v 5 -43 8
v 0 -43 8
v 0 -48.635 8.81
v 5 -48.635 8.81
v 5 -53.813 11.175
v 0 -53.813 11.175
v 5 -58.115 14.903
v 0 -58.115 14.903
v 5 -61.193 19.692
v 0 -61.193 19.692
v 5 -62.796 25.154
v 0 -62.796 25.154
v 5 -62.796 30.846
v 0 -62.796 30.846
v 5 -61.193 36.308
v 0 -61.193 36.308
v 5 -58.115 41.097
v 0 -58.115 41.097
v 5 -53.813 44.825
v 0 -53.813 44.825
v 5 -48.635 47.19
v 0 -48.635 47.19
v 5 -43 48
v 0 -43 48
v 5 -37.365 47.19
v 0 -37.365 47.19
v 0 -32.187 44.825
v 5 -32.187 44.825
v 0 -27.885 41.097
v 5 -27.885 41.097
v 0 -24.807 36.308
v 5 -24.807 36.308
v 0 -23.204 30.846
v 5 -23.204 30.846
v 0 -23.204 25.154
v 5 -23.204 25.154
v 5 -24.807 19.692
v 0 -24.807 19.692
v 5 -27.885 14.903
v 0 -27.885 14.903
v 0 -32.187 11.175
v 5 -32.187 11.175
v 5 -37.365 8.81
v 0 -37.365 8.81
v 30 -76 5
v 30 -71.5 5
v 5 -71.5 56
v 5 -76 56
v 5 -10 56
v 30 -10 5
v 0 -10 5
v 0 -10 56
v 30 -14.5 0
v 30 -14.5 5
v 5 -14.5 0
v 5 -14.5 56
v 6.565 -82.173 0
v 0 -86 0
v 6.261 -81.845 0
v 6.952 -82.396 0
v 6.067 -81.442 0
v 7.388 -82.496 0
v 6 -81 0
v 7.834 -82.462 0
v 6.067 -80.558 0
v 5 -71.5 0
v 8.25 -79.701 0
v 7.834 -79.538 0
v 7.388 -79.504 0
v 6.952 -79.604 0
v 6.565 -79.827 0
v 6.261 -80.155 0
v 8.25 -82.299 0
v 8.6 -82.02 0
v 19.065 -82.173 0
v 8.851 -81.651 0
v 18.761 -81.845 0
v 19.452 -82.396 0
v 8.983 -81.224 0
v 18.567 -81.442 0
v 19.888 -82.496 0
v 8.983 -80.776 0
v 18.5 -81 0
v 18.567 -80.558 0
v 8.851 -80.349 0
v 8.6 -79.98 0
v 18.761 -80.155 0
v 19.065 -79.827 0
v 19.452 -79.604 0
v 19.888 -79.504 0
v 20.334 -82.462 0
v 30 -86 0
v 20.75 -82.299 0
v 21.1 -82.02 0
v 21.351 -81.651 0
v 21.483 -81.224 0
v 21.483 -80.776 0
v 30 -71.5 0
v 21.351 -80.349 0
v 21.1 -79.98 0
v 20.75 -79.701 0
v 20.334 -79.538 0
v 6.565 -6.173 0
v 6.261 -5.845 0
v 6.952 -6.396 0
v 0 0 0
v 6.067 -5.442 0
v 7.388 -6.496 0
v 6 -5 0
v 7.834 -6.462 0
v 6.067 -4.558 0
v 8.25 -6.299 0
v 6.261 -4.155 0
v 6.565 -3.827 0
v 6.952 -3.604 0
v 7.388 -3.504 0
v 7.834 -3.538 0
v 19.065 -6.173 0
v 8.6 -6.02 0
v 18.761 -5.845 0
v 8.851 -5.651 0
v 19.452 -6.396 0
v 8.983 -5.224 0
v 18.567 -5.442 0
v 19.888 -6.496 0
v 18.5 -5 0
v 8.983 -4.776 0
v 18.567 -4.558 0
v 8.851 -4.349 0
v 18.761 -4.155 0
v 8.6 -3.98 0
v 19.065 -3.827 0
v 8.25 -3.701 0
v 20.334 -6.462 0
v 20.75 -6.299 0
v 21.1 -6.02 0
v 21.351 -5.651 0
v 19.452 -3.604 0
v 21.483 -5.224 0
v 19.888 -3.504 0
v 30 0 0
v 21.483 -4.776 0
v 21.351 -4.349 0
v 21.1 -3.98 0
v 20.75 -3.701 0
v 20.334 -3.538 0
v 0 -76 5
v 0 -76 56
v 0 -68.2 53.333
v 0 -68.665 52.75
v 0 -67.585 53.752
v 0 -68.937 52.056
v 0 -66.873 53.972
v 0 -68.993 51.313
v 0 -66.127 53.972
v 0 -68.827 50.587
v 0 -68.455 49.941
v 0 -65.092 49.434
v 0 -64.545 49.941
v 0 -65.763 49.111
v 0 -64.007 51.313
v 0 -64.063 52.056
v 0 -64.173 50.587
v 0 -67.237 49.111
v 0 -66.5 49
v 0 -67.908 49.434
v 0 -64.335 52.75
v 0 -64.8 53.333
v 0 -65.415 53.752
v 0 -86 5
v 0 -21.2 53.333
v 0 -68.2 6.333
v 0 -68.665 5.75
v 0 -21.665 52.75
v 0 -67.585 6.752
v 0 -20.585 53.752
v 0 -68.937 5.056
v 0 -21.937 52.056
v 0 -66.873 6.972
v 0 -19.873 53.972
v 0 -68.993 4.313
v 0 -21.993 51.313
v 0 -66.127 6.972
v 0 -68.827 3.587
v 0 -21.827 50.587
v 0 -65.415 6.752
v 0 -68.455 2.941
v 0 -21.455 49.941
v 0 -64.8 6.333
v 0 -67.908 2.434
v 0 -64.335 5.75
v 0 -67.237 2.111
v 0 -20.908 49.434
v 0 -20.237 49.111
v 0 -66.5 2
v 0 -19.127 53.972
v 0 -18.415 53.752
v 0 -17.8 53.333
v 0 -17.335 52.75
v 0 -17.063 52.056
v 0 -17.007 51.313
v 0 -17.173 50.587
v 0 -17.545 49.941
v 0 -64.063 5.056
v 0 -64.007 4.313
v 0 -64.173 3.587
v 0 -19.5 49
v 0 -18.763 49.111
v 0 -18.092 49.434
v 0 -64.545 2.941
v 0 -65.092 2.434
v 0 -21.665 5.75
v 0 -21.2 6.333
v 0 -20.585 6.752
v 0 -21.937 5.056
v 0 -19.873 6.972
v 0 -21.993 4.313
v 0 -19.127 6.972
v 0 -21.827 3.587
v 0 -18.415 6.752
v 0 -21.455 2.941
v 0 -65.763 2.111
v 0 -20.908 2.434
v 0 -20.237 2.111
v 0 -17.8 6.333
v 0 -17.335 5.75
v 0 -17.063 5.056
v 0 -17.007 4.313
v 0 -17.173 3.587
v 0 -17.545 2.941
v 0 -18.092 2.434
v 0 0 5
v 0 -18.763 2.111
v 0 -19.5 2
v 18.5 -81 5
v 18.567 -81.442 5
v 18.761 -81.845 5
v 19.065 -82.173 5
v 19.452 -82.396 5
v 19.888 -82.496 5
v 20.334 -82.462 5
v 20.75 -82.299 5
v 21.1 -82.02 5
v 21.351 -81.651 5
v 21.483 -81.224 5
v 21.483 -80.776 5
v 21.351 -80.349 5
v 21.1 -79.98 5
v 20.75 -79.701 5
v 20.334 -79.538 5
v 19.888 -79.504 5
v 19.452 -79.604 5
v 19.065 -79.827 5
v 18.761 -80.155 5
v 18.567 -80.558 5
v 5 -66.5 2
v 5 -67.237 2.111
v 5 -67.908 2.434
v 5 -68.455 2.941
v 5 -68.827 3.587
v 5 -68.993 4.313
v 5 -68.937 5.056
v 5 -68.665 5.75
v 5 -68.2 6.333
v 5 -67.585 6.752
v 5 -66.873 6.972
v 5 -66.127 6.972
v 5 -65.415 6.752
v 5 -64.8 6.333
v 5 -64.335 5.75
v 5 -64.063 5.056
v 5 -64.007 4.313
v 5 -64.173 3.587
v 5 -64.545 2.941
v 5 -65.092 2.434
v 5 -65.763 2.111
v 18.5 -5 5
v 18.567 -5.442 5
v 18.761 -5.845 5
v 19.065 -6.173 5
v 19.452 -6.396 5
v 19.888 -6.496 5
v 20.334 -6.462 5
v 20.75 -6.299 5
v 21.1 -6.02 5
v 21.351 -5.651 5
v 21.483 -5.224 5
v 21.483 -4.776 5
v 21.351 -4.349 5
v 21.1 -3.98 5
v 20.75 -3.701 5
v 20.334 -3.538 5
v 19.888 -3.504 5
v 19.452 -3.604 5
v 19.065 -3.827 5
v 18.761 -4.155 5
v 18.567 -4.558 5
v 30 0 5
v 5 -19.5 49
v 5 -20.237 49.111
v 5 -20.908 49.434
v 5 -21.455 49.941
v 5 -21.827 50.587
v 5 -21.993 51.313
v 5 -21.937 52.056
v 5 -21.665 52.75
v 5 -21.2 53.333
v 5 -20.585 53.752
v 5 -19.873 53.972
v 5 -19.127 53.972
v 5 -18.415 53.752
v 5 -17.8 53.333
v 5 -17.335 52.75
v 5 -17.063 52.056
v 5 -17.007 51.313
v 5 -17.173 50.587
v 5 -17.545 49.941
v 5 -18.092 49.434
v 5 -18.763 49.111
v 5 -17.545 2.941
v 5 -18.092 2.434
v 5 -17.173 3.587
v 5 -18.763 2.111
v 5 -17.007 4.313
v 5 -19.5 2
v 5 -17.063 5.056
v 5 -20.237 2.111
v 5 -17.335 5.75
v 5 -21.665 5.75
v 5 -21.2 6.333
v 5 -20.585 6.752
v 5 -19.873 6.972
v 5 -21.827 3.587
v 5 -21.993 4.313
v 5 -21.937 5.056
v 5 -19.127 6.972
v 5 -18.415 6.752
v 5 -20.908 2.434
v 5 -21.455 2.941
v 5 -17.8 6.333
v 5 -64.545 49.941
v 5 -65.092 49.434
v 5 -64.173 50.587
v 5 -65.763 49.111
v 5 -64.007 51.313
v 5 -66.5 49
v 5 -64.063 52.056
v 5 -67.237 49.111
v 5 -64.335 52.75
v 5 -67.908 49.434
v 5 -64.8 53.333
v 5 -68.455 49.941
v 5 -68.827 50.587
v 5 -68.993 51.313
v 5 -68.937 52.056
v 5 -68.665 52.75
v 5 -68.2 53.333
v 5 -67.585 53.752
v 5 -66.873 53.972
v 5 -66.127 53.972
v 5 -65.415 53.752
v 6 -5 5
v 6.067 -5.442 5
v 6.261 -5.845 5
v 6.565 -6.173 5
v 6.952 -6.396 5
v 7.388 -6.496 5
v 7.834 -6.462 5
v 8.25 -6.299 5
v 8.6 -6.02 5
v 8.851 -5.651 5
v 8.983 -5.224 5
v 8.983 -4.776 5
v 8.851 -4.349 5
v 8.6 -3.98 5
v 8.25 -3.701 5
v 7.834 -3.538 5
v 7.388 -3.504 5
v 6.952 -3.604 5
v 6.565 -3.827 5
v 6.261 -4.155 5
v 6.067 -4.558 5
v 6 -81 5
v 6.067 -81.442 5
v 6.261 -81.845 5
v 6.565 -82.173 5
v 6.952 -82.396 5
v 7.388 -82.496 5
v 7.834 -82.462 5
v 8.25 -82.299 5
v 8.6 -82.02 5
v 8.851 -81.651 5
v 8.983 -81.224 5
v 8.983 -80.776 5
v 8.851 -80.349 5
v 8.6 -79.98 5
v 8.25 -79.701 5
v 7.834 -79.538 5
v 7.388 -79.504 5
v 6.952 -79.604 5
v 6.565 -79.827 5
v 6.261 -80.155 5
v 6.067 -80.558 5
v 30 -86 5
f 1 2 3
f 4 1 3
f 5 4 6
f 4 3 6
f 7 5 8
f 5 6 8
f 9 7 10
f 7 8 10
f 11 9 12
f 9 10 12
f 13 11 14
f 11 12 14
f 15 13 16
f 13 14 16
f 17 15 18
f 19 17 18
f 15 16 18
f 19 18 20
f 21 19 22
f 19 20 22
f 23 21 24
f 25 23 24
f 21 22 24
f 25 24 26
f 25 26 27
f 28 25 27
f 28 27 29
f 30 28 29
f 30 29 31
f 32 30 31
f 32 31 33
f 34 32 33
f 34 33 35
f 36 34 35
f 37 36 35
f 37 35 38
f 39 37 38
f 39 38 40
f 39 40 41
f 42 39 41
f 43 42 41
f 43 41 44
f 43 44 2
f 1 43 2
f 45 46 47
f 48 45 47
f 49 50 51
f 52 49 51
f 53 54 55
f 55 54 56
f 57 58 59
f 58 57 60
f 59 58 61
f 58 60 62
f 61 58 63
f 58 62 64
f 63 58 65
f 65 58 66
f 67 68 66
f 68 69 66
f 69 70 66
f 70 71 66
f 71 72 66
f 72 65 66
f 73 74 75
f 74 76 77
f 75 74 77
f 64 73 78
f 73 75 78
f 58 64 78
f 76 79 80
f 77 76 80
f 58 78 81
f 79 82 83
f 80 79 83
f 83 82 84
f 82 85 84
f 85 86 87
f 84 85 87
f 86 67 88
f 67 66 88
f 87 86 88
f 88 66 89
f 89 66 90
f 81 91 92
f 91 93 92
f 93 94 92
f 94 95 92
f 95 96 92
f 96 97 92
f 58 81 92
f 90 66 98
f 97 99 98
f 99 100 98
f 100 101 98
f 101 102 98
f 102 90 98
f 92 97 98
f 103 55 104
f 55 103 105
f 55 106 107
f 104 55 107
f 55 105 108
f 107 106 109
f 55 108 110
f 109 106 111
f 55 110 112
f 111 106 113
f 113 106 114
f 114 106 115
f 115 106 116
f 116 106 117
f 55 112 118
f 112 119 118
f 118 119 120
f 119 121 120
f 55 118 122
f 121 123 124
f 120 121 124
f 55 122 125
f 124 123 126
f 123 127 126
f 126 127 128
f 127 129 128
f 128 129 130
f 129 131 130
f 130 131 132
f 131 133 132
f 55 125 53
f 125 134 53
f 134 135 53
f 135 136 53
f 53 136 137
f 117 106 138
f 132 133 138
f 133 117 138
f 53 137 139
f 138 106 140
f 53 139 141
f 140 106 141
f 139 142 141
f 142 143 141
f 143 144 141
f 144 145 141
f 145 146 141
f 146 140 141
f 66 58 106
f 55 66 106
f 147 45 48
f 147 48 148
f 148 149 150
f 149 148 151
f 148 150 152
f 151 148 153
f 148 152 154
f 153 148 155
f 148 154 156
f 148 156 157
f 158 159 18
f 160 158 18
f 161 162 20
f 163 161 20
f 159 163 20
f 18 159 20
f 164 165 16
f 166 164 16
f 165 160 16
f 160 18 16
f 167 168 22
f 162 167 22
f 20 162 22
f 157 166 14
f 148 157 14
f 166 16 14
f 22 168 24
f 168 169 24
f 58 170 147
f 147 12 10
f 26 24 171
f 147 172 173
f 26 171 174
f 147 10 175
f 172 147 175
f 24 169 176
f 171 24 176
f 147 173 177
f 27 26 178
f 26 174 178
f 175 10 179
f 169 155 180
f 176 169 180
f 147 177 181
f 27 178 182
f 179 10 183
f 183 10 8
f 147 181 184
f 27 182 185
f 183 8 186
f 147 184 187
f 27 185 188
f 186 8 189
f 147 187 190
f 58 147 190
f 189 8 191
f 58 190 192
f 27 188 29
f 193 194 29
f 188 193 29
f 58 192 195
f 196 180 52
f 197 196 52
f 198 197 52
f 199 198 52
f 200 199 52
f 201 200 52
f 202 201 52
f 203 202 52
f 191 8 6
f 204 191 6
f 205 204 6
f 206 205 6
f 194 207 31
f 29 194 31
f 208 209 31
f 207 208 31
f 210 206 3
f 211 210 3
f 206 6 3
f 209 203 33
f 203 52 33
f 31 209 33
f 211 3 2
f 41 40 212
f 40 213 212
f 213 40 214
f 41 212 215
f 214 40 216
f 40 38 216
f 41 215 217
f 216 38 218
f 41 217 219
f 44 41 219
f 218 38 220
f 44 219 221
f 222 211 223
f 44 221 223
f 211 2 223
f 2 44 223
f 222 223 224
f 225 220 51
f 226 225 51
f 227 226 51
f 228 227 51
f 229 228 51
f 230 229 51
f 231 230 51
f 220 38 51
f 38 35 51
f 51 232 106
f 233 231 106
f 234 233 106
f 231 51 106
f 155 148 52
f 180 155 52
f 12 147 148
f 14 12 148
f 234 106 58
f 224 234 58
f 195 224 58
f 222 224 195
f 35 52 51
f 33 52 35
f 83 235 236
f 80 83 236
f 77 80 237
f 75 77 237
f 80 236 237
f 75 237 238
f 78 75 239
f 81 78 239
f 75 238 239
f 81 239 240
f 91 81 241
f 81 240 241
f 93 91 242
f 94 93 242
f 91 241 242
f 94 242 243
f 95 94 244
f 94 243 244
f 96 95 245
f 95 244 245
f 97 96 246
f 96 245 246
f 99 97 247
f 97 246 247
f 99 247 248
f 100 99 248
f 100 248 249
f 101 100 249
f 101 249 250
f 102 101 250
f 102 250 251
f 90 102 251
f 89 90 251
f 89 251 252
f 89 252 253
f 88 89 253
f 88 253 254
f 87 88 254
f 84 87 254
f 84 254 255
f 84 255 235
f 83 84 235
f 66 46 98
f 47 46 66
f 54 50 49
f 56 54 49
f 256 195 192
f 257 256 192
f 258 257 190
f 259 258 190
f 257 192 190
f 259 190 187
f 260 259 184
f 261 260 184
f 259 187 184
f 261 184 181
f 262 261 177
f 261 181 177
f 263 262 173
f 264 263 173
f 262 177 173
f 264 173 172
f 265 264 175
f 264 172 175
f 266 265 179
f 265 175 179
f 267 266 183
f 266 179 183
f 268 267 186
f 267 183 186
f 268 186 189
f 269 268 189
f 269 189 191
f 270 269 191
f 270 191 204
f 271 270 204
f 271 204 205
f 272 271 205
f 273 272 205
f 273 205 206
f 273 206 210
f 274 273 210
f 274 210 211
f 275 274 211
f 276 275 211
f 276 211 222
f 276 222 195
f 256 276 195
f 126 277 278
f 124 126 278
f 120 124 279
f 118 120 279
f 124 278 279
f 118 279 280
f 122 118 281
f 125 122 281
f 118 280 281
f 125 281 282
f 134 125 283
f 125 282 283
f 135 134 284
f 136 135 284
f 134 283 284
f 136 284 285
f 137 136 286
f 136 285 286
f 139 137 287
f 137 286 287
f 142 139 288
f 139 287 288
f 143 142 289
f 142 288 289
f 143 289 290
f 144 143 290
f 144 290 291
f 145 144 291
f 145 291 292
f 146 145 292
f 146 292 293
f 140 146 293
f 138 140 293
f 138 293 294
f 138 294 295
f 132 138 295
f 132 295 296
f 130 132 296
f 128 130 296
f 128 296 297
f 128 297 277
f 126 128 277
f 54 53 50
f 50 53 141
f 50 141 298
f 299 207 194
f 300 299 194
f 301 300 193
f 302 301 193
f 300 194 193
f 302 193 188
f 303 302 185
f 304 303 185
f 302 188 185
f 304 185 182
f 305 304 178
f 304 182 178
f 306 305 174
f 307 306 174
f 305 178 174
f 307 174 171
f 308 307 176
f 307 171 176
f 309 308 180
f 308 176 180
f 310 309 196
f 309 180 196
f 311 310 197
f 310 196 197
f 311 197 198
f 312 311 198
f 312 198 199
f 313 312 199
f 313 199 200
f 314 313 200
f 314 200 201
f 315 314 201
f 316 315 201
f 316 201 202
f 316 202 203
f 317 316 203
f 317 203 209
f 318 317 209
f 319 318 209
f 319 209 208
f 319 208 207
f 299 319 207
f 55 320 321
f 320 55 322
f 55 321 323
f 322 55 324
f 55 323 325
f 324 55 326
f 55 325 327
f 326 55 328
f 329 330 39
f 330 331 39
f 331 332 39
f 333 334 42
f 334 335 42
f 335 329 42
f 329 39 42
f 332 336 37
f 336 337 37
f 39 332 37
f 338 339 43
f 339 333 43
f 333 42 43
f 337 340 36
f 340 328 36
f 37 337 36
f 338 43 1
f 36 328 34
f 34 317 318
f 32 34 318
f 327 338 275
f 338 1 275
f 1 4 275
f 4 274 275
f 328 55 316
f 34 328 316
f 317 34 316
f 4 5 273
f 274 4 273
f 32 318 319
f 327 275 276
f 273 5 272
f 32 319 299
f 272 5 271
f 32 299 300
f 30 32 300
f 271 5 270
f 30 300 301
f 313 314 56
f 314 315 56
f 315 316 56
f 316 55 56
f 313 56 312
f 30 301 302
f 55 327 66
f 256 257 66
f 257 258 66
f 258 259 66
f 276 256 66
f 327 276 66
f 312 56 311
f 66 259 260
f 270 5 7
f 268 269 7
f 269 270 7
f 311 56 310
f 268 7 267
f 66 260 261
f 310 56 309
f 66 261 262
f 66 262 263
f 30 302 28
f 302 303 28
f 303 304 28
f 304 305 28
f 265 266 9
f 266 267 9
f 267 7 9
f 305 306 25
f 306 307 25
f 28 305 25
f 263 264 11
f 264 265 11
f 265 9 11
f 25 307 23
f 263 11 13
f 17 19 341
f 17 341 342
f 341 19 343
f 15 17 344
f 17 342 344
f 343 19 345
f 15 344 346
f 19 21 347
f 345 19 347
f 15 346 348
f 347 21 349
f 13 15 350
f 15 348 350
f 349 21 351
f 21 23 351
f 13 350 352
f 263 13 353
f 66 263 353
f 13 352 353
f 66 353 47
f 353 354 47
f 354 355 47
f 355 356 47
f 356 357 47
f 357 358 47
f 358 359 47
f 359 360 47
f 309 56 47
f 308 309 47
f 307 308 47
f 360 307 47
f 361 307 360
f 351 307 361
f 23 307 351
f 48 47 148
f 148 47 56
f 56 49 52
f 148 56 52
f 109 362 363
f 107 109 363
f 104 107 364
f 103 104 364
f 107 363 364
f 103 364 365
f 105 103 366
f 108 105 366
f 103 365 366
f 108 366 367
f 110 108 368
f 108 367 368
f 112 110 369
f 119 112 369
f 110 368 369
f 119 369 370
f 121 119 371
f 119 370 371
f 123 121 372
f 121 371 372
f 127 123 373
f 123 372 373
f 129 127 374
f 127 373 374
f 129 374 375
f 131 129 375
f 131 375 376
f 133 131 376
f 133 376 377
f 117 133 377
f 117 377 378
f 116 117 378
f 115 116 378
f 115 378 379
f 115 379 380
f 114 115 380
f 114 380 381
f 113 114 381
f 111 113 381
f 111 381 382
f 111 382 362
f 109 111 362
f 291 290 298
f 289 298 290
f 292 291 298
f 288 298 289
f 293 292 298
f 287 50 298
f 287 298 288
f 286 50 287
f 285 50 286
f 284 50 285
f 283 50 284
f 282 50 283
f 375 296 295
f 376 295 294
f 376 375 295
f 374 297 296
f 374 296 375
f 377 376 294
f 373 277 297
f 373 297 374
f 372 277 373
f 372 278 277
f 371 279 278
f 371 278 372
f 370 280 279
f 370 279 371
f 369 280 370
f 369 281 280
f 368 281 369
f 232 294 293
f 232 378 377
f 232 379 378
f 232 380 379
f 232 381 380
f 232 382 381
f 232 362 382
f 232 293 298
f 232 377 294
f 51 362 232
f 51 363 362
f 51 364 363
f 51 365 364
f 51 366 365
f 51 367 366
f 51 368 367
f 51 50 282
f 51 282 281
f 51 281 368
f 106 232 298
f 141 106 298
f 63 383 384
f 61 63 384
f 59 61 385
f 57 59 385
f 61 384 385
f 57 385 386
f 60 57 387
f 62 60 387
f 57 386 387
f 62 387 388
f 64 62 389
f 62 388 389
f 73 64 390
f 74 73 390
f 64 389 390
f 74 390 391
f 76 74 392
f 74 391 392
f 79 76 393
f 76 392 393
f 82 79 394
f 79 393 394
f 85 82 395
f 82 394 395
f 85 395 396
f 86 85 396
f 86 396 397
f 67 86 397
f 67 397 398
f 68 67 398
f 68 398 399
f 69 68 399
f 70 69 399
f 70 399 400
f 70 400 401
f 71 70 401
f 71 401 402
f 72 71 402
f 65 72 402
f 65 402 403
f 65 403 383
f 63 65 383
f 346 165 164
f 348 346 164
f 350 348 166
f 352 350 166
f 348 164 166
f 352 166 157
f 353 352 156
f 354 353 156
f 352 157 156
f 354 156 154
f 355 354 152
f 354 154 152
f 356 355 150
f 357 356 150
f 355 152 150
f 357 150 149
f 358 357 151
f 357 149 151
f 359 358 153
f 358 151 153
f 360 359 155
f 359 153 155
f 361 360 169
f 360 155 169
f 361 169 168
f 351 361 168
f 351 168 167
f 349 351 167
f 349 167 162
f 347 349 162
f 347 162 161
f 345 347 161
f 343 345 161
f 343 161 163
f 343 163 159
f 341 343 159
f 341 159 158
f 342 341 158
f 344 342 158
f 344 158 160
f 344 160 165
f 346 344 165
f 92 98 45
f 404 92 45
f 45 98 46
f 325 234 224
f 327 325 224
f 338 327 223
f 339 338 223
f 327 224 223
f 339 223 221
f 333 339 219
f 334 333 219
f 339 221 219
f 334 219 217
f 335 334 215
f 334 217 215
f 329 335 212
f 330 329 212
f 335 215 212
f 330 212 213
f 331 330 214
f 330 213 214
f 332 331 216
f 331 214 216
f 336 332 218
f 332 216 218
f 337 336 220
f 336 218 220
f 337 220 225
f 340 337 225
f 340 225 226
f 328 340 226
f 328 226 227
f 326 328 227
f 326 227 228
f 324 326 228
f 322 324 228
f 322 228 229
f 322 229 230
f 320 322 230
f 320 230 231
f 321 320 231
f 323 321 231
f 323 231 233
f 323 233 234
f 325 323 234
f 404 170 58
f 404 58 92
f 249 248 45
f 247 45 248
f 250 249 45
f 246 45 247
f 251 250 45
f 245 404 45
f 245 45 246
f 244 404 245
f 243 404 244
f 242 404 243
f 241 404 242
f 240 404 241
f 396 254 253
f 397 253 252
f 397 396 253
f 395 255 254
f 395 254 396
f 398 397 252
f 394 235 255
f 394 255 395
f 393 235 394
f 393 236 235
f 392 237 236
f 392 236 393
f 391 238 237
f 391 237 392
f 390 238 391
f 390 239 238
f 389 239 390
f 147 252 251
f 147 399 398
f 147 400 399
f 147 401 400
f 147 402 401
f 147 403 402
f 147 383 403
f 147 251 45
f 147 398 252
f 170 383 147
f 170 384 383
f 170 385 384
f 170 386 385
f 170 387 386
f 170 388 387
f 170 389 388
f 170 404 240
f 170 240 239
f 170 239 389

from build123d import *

# Parameters (mm, degrees)
PAD_DEPTH       = 86
SKETCH001_W     = 59.039818
SKETCH001_H     = 57
POCKET_DEPTH    = 56.001
SKETCH002_W     = 74.051056
SKETCH002_H     = 10
SKETCH002_W_2   = 70.317291
POCKET001_DEPTH = 51
SKETCH003_R     = 1.5
POCKET002_DEPTH = 5.001
SKETCH005_R     = 20
POCKET003_DEPTH = 30.001
SKETCH006_R     = 2.5
POCKET004_DEPTH = 30.001


with BuildPart() as part:
    # Sketch → Pad (new body)
    with BuildSketch(Plane.XZ):
        Polygon((0, 0), (30, 0), (30, 5), (5, 56), (0, 56), align=None)
    extrude(amount=PAD_DEPTH)

    # Sketch001 (on Face4 of Pad) → Pocket (cut, through all)
    with BuildSketch(Plane(origin=(0, 0, 56), x_dir=(-1, 0, 0), z_dir=(0, 0, 1))):
        with Locations((-34.519909, 43)):
            Rectangle(SKETCH001_W, SKETCH001_H)
    extrude(amount=-POCKET_DEPTH, mode=Mode.SUBTRACT)

    # Sketch002 (on Face11 of Pocket) → Pocket001 (cut)
    with BuildSketch(Plane(origin=(0, 0, 56), x_dir=(-1, 0, 0), z_dir=(0, 0, 1))):
        with Locations((-37.025528, 81)):
            Rectangle(SKETCH002_W, SKETCH002_H)
        with Locations((-35.158645, 5)):
            Rectangle(SKETCH002_W_2, SKETCH002_H)
    extrude(amount=-POCKET001_DEPTH, mode=Mode.SUBTRACT)

    # Sketch003 (on Face14 of Pocket001) → Pocket002 (cut, through all)
    with BuildSketch(Plane(origin=(0, 0, 5), x_dir=(-1, 0, 0), z_dir=(0, 0, 1))):
        with Locations((-20, 81)):
            Circle(SKETCH003_R)
        with Locations((-7.5, 81)):
            Circle(SKETCH003_R)
        with Locations((-20, 5)):
            Circle(SKETCH003_R)
        with Locations((-7.5, 5)):
            Circle(SKETCH003_R)
    extrude(amount=-POCKET002_DEPTH, mode=Mode.SUBTRACT)

    # Sketch005 (on Face3 of Pocket002) → Pocket003 (cut, through all)
    with BuildSketch(Plane(origin=(0, 0, 0), x_dir=(0, 0, -1), z_dir=(-1, 0, 0))):
        with Locations((-28, 43)):
            Circle(SKETCH005_R)
    extrude(amount=-POCKET003_DEPTH, mode=Mode.SUBTRACT)

    # Sketch006 (on Face3 of Pocket003) → Pocket004 (cut, through all)
    with BuildSketch(Plane(origin=(0, 0, 0), x_dir=(0, 0, -1), z_dir=(-1, 0, 0))):
        with Locations((-51.5, 66.5)):
            Circle(SKETCH006_R)
        with Locations((-4.5, 66.5)):
            Circle(SKETCH006_R)
        with Locations((-51.5, 19.5)):
            Circle(SKETCH006_R)
        with Locations((-4.5, 19.5)):
            Circle(SKETCH006_R)
    extrude(amount=-POCKET004_DEPTH, mode=Mode.SUBTRACT)


solid = part.part
